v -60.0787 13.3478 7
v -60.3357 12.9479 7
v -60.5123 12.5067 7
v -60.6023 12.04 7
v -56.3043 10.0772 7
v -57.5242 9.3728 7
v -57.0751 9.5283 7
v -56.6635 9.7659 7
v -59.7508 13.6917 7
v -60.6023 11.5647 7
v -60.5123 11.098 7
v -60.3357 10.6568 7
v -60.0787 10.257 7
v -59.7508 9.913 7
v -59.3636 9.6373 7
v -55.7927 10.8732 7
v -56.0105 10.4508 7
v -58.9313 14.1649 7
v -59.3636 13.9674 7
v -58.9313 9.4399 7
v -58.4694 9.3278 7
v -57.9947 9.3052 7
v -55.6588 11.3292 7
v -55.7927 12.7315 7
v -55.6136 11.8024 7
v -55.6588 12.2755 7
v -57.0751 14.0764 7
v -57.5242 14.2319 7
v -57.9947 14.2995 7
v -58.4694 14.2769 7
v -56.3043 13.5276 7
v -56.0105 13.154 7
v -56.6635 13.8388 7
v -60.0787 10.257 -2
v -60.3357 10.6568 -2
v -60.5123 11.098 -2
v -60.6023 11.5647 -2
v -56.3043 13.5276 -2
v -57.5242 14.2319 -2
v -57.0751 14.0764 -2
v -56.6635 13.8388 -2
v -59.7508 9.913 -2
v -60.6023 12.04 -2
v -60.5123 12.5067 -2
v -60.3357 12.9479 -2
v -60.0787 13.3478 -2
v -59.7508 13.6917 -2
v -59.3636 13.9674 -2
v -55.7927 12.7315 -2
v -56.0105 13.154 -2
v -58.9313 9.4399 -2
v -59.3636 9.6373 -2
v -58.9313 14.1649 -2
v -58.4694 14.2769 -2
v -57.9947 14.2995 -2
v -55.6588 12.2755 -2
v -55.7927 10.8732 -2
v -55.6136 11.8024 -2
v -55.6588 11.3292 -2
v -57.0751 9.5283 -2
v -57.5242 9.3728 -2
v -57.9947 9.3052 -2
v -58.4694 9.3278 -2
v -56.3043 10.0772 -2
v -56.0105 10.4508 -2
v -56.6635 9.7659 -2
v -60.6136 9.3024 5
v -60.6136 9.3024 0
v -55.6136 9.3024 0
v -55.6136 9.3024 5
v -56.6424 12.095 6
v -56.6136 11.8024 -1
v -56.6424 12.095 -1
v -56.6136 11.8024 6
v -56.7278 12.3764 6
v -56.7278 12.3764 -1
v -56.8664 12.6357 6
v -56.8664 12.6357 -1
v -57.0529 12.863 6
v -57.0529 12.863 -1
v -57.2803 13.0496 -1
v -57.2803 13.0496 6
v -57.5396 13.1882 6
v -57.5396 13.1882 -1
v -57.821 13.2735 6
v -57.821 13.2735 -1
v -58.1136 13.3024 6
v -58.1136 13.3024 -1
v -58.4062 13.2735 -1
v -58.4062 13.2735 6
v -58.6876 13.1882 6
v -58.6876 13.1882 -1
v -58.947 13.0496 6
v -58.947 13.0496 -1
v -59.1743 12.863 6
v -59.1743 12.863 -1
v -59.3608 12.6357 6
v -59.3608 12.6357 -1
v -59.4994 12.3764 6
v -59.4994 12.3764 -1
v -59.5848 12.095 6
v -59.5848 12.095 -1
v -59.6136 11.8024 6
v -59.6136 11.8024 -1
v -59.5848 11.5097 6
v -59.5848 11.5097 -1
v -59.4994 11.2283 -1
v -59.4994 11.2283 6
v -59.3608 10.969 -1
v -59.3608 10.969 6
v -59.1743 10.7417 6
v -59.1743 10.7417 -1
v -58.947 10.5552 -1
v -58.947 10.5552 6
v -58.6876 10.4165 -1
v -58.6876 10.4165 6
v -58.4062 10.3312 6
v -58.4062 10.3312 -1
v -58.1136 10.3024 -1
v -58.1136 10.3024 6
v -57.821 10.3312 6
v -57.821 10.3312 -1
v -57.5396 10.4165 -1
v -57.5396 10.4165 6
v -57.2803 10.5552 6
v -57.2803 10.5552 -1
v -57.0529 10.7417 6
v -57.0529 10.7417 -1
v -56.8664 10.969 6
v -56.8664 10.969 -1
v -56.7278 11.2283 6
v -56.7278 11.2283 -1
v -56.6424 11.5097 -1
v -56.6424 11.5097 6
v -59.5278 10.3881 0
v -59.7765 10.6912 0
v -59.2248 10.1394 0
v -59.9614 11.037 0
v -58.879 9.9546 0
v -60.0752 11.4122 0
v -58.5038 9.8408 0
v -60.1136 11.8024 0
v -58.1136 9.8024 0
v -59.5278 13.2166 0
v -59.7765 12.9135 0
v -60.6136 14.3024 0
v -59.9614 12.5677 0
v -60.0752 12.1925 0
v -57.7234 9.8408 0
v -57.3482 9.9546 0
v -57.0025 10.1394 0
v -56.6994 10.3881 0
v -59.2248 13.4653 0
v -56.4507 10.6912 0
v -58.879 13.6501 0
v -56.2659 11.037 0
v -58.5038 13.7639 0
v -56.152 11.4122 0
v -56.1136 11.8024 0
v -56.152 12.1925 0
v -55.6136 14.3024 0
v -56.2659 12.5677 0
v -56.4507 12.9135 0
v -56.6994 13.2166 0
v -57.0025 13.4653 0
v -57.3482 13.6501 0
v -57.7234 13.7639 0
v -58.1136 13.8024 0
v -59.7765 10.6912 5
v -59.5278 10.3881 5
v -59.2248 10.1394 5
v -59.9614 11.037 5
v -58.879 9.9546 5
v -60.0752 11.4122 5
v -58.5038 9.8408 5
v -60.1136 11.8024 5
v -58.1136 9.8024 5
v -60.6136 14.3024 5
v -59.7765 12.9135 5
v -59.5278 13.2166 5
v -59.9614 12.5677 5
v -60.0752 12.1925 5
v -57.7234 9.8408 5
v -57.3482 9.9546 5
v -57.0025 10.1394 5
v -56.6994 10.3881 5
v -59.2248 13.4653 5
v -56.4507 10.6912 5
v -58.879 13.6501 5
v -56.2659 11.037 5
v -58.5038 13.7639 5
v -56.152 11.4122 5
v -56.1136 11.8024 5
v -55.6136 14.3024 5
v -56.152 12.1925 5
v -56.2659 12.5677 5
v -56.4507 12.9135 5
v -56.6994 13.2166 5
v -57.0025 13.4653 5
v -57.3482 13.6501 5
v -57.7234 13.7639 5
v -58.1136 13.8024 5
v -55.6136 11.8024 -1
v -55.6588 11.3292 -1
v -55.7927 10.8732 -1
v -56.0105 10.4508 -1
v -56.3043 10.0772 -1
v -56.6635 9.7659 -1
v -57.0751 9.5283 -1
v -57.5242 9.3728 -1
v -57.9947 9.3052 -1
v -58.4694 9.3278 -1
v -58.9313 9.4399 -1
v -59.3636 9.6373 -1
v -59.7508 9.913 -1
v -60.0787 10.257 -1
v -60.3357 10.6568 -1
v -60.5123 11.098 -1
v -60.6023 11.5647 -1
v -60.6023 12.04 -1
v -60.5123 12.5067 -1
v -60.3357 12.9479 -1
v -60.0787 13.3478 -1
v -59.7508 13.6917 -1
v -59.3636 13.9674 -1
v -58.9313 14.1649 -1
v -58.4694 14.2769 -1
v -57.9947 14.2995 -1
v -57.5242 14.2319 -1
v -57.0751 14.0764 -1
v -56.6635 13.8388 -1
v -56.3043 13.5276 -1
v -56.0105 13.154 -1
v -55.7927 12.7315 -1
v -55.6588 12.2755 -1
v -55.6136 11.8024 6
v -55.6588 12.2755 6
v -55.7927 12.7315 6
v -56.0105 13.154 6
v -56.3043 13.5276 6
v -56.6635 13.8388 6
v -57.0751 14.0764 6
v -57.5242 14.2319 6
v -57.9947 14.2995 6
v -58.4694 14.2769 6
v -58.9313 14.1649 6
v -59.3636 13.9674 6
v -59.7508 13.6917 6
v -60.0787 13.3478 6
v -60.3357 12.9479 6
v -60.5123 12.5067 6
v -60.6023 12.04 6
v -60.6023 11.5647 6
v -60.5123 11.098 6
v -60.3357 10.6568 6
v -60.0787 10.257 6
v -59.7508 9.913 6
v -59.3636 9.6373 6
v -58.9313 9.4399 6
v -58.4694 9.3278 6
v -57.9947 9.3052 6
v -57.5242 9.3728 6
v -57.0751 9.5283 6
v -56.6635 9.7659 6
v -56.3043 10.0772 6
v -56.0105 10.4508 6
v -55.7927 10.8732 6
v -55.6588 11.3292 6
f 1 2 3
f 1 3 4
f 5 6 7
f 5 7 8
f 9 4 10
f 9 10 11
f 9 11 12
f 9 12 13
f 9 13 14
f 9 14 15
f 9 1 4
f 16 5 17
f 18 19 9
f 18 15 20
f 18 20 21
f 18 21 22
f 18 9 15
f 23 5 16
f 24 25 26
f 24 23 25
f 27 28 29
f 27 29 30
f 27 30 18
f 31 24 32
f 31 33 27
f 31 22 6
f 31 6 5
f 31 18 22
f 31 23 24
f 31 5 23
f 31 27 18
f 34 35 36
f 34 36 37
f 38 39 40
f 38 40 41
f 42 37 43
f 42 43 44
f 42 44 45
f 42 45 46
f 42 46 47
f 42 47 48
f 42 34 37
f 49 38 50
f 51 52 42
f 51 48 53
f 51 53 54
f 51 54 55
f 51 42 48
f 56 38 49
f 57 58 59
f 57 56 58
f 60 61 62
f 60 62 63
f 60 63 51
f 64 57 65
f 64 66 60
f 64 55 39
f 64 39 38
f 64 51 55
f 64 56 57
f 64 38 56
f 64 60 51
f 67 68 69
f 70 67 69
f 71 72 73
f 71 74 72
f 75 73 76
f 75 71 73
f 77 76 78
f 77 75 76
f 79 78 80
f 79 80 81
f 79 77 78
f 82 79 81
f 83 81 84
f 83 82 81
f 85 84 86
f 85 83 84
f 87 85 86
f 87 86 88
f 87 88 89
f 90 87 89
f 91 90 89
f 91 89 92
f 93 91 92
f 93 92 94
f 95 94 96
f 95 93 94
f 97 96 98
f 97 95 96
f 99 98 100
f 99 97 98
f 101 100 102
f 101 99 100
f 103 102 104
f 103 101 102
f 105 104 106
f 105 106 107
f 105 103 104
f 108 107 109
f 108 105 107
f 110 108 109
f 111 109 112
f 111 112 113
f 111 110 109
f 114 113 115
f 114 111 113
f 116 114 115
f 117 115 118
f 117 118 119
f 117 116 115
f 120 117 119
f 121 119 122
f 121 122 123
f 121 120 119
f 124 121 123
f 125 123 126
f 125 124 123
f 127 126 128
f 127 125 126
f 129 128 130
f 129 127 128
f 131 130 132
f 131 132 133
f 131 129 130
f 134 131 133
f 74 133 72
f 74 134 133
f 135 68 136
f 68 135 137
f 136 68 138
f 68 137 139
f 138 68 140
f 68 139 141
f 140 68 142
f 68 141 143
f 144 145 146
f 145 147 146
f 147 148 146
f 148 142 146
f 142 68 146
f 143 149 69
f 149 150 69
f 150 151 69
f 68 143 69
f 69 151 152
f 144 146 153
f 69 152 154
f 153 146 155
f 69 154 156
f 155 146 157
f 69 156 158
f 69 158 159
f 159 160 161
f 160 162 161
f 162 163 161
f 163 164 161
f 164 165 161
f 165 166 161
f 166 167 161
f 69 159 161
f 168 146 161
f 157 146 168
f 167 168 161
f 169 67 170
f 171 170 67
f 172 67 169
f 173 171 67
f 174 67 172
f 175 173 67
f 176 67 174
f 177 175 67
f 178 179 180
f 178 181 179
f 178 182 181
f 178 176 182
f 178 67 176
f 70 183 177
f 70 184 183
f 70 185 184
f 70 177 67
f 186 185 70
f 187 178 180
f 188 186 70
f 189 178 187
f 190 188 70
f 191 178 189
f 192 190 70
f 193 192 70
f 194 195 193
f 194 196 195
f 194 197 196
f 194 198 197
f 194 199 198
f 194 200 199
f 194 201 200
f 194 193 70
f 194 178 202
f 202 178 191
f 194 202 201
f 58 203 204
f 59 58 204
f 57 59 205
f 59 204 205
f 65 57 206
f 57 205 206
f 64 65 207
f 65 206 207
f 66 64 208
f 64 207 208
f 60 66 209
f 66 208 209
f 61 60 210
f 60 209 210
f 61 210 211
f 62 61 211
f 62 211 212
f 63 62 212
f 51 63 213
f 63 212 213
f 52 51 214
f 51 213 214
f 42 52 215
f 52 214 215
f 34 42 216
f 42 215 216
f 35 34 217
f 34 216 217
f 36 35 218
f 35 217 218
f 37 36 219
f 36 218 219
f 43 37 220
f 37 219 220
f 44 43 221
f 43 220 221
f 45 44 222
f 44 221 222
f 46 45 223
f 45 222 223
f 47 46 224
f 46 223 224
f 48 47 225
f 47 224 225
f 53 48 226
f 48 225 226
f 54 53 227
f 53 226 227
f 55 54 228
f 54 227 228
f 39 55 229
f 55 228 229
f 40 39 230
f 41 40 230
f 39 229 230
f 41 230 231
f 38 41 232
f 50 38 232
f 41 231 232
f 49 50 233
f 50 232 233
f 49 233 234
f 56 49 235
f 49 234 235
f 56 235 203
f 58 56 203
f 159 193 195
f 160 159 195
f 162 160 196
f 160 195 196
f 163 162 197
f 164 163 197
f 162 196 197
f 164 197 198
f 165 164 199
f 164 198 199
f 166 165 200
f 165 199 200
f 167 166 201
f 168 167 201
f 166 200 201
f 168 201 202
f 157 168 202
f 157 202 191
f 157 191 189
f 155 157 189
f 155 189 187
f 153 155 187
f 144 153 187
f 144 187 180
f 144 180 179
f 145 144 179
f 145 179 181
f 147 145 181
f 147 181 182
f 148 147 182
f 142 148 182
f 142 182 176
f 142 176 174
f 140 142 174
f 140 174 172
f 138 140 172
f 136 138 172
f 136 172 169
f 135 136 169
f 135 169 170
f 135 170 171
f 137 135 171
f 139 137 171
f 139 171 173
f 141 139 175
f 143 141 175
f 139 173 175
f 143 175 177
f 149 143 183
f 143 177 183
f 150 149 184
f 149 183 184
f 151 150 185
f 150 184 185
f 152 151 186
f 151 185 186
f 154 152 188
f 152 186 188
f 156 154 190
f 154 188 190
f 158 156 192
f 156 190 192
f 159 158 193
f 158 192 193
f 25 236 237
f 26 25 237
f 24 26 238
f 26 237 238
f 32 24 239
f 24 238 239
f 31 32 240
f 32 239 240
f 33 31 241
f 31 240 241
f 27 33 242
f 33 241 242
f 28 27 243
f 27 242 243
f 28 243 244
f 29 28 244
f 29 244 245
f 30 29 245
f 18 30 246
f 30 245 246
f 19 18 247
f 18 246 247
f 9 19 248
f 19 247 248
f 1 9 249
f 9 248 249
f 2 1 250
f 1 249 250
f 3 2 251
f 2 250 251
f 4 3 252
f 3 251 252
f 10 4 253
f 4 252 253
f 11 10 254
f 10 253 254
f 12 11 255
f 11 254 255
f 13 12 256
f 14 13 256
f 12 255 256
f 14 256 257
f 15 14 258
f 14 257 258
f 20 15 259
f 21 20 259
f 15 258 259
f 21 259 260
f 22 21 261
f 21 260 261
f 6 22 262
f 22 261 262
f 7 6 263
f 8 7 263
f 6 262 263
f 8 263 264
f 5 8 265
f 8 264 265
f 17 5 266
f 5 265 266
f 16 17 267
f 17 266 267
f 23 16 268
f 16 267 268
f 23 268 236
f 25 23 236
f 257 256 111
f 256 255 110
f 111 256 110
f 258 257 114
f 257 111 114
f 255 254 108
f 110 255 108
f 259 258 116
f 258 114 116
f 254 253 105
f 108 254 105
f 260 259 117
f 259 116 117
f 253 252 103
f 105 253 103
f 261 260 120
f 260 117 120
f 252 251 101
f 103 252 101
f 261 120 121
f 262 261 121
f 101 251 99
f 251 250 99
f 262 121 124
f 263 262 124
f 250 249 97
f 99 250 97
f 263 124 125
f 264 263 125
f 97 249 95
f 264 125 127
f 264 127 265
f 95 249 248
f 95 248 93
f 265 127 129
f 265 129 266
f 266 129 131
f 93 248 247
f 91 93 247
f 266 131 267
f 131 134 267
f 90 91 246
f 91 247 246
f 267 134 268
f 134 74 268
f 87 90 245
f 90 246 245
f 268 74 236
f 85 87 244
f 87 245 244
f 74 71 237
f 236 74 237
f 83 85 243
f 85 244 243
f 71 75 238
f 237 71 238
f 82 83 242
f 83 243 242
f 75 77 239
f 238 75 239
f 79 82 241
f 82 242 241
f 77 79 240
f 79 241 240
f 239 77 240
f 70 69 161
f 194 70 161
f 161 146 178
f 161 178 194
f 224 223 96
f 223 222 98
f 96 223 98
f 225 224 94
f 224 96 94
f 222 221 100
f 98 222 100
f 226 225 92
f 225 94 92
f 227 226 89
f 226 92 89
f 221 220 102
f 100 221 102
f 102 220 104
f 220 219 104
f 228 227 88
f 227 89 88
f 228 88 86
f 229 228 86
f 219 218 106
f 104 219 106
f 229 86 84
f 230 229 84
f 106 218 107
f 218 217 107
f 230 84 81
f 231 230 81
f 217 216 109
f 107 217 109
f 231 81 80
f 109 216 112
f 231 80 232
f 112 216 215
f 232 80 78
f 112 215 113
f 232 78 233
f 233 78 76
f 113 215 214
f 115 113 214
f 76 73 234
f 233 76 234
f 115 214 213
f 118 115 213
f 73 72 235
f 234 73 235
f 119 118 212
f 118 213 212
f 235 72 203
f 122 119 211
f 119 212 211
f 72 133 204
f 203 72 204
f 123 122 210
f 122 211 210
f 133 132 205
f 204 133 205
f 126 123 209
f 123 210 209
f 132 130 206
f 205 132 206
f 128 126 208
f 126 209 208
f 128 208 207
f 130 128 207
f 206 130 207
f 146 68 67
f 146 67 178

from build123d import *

# Parameters (mm, degrees)
F0_W      = 5
F0_H      = 5
F1_DEPTH  = 5
F2_R      = 2
F3_DEPTH  = 25
F4_R      = 1.5
F5_DEPTH  = 6
F6_DEPTH  = 1
F7_R      = 2.5
F8_DEPTH  = 1
F9_R      = 2.5
F10_DEPTH = 1


with BuildPart() as f1:
    # F0 (on Top) → F1 (new body)
    with BuildSketch(Plane.XY):
        with Locations((-58.11361, 11.802363)):
            Rectangle(F0_W, F0_H)
    extrude(amount=F1_DEPTH)

    # F2 (on face) → F3 (cut)
    with BuildSketch(Plane.XY.offset(5)):
        with Locations((-58.11361, 11.802363)):
            Circle(F2_R)
    extrude(amount=-F3_DEPTH, mode=Mode.SUBTRACT)


with BuildPart() as f5:
    # F4 (on Top) → F5 (new body)
    with BuildSketch(Plane.XY):
        with Locations((-58.11361, 11.802363)):
            Circle(F4_R)
    extrude(amount=F5_DEPTH)

    # F4 (on Top) → F6 (join)
    with BuildSketch(Plane.XY):
        with Locations((-58.11361, 11.802363)):
            Circle(F4_R)
    extrude(amount=-F6_DEPTH)

    # F7 (on face) → F8 (join)
    with BuildSketch(Plane.XY.offset(6)):
        with Locations((-58.11361, 11.802363)):
            Circle(F7_R)
    extrude(amount=F8_DEPTH)

    # F9 (on face) → F10 (join)
    with BuildSketch(Plane(origin=(0, 0, -1), x_dir=(1, 0, 0), z_dir=(0, 0, -1))):
        with Locations((-58.11361, -11.802363)):
            Circle(F9_R)
    extrude(amount=F10_DEPTH)


solid = Compound([f1.part, f5.part])
